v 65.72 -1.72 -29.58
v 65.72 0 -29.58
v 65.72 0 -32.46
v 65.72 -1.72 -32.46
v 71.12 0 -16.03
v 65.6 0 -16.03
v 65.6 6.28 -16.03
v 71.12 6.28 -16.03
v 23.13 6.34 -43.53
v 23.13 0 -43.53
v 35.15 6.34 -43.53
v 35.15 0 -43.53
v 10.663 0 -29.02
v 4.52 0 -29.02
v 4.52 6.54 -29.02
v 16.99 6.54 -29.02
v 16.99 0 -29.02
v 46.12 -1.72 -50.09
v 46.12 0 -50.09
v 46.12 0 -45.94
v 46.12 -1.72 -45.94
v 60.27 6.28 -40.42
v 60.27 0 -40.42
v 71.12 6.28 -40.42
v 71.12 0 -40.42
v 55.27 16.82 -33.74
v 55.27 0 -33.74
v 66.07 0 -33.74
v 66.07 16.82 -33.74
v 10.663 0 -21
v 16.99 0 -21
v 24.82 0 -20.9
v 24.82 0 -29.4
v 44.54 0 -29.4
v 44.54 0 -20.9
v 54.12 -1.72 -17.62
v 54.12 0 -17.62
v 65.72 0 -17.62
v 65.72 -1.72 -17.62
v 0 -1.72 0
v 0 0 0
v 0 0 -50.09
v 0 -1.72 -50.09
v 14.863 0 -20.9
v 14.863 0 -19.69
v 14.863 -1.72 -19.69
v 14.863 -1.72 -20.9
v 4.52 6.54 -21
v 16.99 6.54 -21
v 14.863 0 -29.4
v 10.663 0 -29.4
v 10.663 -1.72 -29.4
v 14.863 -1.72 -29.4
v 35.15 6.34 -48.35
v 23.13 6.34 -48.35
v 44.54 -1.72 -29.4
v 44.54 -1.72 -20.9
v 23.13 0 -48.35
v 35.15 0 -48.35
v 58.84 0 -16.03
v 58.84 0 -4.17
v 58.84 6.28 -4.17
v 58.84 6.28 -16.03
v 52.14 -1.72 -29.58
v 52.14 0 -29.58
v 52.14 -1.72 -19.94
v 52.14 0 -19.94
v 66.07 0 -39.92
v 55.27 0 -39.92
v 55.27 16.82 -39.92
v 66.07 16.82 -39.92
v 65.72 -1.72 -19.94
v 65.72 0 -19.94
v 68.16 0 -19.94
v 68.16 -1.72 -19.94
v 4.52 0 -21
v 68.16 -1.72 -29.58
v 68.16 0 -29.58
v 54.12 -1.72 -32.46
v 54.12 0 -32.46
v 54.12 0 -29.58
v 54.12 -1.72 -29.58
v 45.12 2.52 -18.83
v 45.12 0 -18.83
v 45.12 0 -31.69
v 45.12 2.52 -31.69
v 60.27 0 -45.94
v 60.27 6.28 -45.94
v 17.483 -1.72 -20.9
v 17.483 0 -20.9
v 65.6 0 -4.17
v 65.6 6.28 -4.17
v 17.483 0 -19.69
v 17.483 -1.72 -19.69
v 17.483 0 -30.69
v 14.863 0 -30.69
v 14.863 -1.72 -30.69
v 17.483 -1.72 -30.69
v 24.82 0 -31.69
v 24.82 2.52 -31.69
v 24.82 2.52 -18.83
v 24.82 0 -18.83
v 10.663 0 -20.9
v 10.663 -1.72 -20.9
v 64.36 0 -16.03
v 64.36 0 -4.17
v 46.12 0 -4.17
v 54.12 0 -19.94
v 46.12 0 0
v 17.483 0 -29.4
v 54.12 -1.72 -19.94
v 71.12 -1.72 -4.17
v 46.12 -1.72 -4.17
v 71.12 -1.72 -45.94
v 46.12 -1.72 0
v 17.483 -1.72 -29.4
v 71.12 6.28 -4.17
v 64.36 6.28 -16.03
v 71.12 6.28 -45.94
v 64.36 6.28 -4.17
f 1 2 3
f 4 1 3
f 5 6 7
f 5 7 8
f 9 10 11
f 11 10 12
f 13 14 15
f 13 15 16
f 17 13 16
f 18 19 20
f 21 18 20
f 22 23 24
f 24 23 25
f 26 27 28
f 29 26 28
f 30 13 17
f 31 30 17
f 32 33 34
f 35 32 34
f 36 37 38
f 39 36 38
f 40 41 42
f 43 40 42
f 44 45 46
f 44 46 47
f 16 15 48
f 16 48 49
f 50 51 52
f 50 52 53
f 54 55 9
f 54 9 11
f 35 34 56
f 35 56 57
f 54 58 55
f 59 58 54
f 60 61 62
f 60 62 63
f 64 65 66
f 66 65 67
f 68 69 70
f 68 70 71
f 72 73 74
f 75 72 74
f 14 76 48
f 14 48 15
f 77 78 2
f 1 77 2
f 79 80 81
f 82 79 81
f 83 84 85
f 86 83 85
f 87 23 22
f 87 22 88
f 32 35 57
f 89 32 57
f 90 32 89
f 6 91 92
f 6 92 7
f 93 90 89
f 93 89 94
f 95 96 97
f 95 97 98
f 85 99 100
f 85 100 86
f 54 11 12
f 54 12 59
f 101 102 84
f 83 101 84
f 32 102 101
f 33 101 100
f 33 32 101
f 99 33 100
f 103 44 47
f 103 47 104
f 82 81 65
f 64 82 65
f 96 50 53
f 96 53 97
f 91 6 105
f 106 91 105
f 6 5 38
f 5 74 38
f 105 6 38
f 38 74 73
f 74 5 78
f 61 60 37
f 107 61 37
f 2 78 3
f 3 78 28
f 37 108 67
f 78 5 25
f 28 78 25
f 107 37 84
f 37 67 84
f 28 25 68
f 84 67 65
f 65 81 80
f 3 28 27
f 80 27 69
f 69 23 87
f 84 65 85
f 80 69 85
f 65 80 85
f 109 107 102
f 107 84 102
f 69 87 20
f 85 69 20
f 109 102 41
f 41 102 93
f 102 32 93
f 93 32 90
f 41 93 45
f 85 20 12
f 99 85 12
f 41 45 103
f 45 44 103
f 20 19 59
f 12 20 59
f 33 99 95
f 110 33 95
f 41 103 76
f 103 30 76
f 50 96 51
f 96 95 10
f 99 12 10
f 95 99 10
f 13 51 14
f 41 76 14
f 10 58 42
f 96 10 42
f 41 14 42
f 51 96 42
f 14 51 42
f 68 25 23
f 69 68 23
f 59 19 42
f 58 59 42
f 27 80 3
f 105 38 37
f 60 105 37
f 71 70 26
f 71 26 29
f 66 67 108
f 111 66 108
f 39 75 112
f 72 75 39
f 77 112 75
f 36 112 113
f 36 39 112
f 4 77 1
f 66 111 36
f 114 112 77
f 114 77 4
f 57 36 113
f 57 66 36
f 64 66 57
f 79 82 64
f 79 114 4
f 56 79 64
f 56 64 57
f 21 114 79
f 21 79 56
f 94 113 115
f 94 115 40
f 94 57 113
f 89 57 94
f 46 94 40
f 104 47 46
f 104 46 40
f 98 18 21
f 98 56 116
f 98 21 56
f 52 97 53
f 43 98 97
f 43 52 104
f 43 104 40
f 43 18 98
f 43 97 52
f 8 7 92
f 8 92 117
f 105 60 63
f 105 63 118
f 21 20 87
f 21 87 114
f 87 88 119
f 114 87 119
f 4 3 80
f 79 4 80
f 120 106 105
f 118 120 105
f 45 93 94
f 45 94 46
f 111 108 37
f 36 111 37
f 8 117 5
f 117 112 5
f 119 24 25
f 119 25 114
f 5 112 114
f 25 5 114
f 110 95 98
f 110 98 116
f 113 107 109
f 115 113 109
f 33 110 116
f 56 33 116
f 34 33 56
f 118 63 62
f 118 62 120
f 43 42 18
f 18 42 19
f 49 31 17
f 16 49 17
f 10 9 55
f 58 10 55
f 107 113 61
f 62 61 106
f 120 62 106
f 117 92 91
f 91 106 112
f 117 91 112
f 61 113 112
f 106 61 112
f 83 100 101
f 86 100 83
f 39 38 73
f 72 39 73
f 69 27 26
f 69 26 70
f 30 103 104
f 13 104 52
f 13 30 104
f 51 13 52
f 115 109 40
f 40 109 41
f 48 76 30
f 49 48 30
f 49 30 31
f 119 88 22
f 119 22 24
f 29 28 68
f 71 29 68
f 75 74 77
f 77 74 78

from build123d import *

# Parameters (mm, degrees)
BOSS_EXTRUDE1_DEPTH  = 1.72
CUT_EXTRUDE1_DEPTH   = 1.72
SKETCH6_W            = 5.52
SKETCH6_H            = 11.86
SKETCH6_W_2          = 10.85
SKETCH6_H_2          = 5.52
SWITCHES_DEPTH       = 6.28
SKETCH7_W            = 10.8
SKETCH7_H            = 6.18
SCROLLWHEEL_DEPTH    = 16.82
SKETCH8_W            = 20.3
SKETCH8_H            = 12.86
CHIP_DEPTH           = 2.52
SKETCH9_W            = 12.02
SKETCH9_H            = 4.82
USB_CONNECTION_DEPTH = 6.34
SKETCH10_W           = 12.47
SKETCH10_H           = 8.02
LASER_DEPTH          = 6.54


with BuildPart() as part:
    # Sketch1 → Boss-Extrude1 (new body)
    with BuildSketch(Plane(origin=(0, 0, 0), x_dir=(1, 0, 0), z_dir=(0, 1, 0))):
        Polygon((46.12, 45.94), (71.12, 45.94), (71.12, 4.17), (46.12, 4.17), (46.12, 0), (0, 0), (0, 50.09), (46.12, 50.09), align=None)
    extrude(amount=-BOSS_EXTRUDE1_DEPTH)

    # Sketch2 → Cut-Extrude1 (cut)
    with BuildSketch(Plane(origin=(0, 0, 0), x_dir=(1, 0, 0), z_dir=(0, 1, 0))):
        Polygon((65.72, 32.46), (54.12, 32.46), (54.12, 29.58), (52.14, 29.58), (52.14, 19.94), (54.12, 19.94), (54.12, 17.62), (65.72, 17.62), (65.72, 19.94), (68.16, 19.94), (68.16, 29.58), (65.72, 29.58), align=None)
        Polygon((17.483002282, 20.9), (17.483002282, 19.69), (14.863002282, 19.69), (14.863002282, 20.9), (10.663002282, 20.9), (10.663002282, 29.4), (14.863002282, 29.4), (14.863002282, 30.69), (17.483002282, 30.69), (17.483002282, 29.4), (44.54, 29.4), (44.54, 20.9), align=None)
    extrude(amount=-CUT_EXTRUDE1_DEPTH, mode=Mode.SUBTRACT)

    # Sketch6 → switches (add)
    with BuildSketch(Plane(origin=(0, 0, 0), x_dir=(1, 0, 0), z_dir=(0, 1, 0))):
        with Locations((68.36, 10.1)):
            Rectangle(SKETCH6_W, SKETCH6_H)
        with Locations((61.6, 10.1)):
            Rectangle(SKETCH6_W, SKETCH6_H)
        with Locations((65.695, 43.18)):
            Rectangle(SKETCH6_W_2, SKETCH6_H_2)
    extrude(amount=SWITCHES_DEPTH)

    # Sketch7 → scrollWheel (add)
    with BuildSketch(Plane(origin=(0, 0, 0), x_dir=(1, 0, 0), z_dir=(0, 1, 0))):
        with Locations((60.67, 36.83)):
            Rectangle(SKETCH7_W, SKETCH7_H)
    extrude(amount=SCROLLWHEEL_DEPTH)

    # Sketch8 → chip (add)
    with BuildSketch(Plane(origin=(0, 0, 0), x_dir=(1, 0, 0), z_dir=(0, 1, 0))):
        with Locations((34.97, 25.26)):
            Rectangle(SKETCH8_W, SKETCH8_H)
    extrude(amount=CHIP_DEPTH)

    # Sketch9 → USB Connection (add)
    with BuildSketch(Plane(origin=(0, 0, 0), x_dir=(1, 0, 0), z_dir=(0, 1, 0))):
        with Locations((29.14, 45.94)):
            Rectangle(SKETCH9_W, SKETCH9_H)
    extrude(amount=USB_CONNECTION_DEPTH)

    # Sketch10 → laser (add)
    with BuildSketch(Plane(origin=(0, 0, 0), x_dir=(1, 0, 0), z_dir=(0, 1, 0))):
        with Locations((10.755, 25.01)):
            Rectangle(SKETCH10_W, SKETCH10_H)
    extrude(amount=LASER_DEPTH)


solid = part.part
